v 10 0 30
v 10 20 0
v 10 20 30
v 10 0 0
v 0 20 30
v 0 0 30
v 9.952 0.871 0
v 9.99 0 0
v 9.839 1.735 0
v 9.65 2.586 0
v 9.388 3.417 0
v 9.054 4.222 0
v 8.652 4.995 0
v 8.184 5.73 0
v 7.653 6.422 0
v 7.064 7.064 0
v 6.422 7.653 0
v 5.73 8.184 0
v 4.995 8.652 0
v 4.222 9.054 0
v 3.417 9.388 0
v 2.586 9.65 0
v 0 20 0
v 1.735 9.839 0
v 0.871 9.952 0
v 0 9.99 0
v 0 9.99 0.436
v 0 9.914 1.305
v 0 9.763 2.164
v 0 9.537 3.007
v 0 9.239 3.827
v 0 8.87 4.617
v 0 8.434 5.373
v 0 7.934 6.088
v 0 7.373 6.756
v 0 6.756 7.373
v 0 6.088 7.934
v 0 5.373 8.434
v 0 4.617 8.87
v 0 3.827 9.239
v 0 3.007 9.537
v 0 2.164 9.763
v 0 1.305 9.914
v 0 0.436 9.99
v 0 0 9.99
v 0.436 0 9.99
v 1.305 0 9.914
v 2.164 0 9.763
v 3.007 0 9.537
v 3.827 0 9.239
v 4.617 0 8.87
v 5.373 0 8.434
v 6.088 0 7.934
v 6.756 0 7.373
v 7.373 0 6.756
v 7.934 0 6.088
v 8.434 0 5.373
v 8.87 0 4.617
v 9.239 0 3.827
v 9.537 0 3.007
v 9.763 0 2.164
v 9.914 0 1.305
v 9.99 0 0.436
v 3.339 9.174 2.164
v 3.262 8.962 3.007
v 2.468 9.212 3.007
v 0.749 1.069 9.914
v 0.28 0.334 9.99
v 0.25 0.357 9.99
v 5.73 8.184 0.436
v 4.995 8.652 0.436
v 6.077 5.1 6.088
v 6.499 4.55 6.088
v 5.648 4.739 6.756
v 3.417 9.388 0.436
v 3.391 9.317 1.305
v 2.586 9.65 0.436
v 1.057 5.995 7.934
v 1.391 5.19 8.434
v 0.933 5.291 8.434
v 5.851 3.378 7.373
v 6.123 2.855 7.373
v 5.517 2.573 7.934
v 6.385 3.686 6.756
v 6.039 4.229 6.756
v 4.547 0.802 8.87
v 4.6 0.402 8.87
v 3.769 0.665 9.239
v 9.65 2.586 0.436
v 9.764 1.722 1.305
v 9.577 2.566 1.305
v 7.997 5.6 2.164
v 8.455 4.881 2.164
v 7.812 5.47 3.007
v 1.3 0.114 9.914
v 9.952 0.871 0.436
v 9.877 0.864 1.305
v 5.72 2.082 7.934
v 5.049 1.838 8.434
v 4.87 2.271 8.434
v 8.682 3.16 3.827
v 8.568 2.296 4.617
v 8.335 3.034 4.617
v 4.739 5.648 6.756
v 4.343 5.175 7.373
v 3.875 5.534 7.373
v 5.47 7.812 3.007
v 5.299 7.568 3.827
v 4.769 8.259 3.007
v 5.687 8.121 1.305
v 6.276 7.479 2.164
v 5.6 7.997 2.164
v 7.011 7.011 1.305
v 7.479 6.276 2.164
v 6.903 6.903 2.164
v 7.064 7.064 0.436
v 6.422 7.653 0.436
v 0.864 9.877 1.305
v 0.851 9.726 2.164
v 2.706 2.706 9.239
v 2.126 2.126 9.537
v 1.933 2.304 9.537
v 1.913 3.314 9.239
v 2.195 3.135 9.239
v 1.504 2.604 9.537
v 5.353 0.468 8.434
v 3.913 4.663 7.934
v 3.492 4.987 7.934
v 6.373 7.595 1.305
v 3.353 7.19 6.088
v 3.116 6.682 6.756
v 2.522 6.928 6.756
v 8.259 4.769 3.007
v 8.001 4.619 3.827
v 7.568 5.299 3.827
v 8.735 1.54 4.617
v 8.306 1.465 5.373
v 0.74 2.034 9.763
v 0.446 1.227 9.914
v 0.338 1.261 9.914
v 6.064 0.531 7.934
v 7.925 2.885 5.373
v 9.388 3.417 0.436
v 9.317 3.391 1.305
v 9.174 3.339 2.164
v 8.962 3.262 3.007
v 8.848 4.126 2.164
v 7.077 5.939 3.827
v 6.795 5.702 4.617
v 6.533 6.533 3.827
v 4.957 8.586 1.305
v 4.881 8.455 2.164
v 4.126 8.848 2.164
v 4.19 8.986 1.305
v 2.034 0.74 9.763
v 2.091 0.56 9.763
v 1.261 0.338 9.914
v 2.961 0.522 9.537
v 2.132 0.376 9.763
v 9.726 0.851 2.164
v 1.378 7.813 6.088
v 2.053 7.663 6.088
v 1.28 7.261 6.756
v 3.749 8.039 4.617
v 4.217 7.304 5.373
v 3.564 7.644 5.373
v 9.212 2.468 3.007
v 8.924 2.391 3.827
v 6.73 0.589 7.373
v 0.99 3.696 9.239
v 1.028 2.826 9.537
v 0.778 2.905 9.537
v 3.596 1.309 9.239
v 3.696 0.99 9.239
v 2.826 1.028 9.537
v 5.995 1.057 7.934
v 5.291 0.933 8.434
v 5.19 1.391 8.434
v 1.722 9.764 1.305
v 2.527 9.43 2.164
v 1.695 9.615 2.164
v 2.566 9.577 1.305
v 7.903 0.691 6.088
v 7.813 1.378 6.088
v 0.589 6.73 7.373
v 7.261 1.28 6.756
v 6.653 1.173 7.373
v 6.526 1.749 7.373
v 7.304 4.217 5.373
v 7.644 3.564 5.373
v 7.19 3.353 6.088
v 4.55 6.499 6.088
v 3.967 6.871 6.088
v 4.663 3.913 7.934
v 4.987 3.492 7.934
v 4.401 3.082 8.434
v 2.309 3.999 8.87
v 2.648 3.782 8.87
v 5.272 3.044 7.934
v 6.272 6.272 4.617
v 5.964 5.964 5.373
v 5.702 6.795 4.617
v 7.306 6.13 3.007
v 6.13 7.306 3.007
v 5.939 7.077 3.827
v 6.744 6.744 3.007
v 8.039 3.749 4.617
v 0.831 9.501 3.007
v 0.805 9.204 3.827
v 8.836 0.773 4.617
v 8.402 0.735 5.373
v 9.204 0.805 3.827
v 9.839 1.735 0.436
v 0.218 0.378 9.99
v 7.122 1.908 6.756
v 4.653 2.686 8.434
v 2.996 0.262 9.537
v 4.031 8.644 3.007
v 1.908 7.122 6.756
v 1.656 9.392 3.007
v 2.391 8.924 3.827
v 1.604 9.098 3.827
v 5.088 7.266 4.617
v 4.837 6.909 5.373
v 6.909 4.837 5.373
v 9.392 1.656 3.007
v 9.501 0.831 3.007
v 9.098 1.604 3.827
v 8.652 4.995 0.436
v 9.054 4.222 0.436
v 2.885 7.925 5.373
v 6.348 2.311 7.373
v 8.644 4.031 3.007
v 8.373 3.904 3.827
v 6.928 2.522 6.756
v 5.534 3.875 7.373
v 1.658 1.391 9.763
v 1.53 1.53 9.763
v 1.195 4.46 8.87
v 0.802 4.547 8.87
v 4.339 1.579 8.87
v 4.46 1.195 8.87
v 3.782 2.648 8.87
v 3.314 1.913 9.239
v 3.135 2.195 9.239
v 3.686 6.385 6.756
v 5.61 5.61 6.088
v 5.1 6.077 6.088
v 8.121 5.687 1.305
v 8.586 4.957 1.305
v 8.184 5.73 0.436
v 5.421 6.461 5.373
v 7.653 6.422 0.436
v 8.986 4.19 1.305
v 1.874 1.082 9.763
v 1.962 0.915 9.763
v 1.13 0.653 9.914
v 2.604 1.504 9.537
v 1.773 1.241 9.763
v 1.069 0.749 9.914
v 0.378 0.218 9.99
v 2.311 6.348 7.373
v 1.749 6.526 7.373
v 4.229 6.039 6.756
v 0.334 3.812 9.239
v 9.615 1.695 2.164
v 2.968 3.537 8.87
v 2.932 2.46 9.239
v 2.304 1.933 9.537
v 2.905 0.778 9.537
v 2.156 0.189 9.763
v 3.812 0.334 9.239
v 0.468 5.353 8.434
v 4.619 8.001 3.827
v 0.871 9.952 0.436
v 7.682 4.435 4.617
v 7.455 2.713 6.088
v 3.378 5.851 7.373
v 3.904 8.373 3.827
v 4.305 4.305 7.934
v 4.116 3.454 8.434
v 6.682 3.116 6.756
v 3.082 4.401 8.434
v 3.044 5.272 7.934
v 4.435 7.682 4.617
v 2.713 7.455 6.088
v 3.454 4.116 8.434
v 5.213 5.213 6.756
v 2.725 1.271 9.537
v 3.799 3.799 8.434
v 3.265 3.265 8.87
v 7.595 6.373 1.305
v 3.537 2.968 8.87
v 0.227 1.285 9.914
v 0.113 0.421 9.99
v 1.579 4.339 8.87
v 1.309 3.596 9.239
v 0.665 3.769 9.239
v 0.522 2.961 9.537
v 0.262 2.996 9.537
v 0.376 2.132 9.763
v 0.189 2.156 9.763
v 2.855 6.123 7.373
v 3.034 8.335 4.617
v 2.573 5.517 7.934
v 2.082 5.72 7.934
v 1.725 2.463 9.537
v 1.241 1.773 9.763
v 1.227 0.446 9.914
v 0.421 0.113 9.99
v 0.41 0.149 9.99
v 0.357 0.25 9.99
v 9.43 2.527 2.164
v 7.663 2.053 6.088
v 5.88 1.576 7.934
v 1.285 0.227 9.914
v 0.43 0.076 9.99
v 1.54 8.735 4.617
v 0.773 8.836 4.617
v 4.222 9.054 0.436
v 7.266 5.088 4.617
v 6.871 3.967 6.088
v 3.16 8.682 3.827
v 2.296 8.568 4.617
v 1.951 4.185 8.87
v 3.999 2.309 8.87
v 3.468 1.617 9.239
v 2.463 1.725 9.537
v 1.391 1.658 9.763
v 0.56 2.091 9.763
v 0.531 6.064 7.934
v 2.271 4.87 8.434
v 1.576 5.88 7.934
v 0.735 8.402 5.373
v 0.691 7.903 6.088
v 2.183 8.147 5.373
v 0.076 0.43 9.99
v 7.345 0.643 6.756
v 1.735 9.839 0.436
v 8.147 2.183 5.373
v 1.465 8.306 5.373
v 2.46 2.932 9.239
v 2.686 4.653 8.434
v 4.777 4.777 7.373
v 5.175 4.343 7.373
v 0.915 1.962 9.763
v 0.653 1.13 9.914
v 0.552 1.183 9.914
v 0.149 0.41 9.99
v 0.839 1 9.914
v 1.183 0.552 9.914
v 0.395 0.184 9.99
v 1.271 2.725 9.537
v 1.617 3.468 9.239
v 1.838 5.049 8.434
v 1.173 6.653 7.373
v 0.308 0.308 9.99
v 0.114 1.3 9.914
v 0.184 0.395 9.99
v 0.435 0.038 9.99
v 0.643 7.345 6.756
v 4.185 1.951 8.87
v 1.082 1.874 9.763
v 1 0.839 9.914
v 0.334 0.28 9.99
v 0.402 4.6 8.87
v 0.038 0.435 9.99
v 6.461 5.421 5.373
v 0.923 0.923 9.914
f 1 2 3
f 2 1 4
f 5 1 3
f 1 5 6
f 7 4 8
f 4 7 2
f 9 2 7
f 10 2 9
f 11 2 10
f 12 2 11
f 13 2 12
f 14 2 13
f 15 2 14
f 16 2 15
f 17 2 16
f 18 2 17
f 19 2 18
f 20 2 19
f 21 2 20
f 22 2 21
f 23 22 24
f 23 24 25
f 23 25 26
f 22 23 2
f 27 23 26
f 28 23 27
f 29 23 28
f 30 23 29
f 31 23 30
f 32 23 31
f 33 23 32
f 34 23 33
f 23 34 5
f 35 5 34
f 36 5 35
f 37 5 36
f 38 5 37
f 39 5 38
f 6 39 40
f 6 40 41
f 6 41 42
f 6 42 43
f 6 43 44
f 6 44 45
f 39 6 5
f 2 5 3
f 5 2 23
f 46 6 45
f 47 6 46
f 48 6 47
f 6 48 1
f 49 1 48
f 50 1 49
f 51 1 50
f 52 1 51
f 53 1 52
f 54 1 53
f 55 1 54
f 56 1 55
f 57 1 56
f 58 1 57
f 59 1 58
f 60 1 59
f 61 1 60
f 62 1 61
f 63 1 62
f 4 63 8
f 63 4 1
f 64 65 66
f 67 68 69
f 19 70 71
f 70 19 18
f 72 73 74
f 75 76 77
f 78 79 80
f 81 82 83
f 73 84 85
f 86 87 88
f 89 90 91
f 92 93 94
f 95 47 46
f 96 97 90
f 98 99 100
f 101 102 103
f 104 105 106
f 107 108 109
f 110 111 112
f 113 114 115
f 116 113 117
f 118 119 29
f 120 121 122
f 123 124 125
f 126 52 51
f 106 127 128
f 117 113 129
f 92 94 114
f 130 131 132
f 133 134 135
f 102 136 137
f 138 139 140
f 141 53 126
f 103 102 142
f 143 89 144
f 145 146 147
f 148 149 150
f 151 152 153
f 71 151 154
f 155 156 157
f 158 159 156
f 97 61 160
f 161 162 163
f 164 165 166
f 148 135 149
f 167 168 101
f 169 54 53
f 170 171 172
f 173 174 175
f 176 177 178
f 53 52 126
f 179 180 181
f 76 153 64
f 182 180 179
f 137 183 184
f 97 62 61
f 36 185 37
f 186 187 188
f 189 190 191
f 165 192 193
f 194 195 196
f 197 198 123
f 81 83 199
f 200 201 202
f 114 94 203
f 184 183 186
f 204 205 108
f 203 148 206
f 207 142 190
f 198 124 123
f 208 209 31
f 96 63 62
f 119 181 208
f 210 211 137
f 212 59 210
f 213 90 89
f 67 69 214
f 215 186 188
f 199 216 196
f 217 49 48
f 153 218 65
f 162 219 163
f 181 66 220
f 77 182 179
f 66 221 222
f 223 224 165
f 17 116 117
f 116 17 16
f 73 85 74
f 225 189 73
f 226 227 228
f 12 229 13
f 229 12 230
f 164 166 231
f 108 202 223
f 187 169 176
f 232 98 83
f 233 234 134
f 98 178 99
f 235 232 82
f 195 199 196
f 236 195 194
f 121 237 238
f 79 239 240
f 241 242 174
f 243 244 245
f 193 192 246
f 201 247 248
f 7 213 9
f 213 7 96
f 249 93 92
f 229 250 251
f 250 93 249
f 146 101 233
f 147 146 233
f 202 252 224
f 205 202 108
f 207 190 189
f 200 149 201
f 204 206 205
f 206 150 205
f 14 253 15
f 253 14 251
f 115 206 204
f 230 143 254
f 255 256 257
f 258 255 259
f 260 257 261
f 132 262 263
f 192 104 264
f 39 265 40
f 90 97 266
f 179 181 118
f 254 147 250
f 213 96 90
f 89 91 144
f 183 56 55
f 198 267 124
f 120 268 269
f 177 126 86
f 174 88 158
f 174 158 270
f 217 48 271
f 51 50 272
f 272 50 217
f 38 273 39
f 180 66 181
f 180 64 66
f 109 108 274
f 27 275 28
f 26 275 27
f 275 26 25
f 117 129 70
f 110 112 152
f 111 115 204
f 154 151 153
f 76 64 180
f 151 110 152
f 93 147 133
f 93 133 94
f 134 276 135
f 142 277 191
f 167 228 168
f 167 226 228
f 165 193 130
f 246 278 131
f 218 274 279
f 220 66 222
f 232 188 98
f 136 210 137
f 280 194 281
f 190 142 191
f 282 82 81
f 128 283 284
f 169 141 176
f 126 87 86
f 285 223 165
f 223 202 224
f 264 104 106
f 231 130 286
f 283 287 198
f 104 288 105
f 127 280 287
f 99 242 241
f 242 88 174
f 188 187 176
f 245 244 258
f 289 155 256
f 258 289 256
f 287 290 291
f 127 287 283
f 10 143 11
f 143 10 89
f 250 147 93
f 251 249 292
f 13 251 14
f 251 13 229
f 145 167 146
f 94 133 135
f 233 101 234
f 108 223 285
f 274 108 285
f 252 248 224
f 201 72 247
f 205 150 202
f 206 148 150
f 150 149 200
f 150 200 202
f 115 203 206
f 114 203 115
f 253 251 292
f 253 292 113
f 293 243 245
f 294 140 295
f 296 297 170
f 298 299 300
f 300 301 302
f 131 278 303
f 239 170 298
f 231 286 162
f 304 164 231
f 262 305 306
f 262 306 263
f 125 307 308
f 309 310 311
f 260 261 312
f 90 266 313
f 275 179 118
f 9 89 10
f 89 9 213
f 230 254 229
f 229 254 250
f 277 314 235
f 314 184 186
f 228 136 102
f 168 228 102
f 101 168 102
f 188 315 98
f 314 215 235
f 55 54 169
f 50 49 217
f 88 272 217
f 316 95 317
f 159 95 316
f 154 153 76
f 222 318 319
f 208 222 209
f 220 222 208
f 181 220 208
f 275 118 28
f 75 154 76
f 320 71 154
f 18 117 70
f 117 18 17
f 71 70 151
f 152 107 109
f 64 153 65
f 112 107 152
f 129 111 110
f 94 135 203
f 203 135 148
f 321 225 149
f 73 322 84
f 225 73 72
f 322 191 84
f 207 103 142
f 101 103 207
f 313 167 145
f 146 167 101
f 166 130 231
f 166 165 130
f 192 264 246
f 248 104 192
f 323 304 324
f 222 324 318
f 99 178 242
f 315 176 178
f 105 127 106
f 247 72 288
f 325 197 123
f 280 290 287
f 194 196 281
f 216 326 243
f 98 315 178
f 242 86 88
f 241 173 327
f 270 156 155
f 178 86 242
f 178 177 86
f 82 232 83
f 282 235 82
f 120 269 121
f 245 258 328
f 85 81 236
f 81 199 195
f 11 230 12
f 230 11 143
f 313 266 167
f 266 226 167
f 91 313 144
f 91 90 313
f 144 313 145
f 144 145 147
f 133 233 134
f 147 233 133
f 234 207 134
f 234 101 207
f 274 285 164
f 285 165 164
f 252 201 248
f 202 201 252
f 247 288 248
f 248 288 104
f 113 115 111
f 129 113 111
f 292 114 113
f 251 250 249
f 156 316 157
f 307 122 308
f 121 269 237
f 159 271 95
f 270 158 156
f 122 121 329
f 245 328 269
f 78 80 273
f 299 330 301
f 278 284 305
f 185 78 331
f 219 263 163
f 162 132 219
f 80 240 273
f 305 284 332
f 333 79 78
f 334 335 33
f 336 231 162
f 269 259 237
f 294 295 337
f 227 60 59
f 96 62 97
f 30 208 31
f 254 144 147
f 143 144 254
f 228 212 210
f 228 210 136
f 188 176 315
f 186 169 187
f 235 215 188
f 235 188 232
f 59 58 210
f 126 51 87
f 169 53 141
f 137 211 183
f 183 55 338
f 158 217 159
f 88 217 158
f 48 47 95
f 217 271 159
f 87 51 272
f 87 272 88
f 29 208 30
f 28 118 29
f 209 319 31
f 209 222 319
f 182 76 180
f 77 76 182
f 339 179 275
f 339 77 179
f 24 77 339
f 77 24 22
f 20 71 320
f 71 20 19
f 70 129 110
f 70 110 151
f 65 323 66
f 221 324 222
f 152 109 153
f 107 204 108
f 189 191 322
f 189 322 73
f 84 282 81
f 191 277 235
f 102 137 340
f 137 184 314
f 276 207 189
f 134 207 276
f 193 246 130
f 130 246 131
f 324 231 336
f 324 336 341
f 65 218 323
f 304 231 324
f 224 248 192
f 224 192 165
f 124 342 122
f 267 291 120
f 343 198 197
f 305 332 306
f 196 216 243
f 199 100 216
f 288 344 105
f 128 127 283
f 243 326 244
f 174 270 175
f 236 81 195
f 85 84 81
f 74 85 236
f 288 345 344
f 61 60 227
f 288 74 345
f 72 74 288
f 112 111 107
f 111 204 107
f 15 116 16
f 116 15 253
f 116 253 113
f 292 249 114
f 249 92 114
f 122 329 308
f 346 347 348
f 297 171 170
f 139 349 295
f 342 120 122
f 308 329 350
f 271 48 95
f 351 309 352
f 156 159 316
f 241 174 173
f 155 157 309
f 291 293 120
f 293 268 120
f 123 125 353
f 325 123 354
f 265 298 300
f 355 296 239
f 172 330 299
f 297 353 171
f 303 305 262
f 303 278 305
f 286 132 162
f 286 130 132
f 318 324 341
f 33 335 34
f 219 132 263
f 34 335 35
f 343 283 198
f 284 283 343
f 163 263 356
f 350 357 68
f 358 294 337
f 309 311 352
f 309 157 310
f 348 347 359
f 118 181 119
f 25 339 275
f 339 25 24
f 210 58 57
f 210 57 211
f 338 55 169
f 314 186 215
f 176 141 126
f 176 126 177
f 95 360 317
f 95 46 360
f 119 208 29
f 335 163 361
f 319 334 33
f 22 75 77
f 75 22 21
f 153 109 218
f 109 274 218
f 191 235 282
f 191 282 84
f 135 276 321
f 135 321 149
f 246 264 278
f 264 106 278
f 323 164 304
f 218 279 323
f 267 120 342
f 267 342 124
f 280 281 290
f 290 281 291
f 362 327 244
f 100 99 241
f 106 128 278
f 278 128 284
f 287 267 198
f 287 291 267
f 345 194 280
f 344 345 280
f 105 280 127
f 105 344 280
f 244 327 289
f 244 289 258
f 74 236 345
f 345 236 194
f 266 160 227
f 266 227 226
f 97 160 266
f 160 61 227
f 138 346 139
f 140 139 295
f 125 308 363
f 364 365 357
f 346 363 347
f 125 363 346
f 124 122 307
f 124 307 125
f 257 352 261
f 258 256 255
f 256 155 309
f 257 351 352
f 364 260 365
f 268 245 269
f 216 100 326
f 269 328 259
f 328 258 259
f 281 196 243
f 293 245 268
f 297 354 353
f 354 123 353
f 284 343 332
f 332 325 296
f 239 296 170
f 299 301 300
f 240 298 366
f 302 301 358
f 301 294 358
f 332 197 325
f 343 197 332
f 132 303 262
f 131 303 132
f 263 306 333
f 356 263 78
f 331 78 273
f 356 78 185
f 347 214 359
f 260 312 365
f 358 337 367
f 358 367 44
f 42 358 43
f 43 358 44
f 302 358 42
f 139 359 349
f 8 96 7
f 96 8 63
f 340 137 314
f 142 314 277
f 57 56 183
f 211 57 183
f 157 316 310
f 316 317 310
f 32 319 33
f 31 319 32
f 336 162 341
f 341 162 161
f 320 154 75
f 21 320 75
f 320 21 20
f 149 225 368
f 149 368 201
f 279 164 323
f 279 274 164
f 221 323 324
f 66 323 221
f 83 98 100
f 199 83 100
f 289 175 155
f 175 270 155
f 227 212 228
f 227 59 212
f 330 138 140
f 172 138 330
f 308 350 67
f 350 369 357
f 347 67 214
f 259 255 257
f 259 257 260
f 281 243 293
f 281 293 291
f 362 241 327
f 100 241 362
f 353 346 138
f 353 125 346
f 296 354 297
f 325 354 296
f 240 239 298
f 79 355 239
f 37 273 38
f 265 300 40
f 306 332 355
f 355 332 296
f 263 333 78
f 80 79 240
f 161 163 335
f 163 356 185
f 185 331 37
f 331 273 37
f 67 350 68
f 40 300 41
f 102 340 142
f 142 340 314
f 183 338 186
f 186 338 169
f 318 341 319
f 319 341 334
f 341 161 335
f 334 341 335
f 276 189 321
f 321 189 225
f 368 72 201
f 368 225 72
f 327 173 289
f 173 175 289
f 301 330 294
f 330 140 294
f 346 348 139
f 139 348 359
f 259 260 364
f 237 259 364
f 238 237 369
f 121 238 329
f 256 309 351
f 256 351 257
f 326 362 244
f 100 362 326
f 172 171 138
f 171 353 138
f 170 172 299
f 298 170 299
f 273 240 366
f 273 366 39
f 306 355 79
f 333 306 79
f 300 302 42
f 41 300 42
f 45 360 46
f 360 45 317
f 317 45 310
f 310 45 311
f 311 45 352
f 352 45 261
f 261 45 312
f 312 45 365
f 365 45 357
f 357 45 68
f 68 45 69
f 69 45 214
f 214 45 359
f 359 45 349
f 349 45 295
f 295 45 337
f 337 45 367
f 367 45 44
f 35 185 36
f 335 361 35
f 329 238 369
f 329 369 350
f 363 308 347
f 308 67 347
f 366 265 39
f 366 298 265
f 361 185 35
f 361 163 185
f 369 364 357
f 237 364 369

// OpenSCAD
$fn = 72;

difference() {
	cube(size = [10, 20, 30]);
	sphere(r = 10);
}
